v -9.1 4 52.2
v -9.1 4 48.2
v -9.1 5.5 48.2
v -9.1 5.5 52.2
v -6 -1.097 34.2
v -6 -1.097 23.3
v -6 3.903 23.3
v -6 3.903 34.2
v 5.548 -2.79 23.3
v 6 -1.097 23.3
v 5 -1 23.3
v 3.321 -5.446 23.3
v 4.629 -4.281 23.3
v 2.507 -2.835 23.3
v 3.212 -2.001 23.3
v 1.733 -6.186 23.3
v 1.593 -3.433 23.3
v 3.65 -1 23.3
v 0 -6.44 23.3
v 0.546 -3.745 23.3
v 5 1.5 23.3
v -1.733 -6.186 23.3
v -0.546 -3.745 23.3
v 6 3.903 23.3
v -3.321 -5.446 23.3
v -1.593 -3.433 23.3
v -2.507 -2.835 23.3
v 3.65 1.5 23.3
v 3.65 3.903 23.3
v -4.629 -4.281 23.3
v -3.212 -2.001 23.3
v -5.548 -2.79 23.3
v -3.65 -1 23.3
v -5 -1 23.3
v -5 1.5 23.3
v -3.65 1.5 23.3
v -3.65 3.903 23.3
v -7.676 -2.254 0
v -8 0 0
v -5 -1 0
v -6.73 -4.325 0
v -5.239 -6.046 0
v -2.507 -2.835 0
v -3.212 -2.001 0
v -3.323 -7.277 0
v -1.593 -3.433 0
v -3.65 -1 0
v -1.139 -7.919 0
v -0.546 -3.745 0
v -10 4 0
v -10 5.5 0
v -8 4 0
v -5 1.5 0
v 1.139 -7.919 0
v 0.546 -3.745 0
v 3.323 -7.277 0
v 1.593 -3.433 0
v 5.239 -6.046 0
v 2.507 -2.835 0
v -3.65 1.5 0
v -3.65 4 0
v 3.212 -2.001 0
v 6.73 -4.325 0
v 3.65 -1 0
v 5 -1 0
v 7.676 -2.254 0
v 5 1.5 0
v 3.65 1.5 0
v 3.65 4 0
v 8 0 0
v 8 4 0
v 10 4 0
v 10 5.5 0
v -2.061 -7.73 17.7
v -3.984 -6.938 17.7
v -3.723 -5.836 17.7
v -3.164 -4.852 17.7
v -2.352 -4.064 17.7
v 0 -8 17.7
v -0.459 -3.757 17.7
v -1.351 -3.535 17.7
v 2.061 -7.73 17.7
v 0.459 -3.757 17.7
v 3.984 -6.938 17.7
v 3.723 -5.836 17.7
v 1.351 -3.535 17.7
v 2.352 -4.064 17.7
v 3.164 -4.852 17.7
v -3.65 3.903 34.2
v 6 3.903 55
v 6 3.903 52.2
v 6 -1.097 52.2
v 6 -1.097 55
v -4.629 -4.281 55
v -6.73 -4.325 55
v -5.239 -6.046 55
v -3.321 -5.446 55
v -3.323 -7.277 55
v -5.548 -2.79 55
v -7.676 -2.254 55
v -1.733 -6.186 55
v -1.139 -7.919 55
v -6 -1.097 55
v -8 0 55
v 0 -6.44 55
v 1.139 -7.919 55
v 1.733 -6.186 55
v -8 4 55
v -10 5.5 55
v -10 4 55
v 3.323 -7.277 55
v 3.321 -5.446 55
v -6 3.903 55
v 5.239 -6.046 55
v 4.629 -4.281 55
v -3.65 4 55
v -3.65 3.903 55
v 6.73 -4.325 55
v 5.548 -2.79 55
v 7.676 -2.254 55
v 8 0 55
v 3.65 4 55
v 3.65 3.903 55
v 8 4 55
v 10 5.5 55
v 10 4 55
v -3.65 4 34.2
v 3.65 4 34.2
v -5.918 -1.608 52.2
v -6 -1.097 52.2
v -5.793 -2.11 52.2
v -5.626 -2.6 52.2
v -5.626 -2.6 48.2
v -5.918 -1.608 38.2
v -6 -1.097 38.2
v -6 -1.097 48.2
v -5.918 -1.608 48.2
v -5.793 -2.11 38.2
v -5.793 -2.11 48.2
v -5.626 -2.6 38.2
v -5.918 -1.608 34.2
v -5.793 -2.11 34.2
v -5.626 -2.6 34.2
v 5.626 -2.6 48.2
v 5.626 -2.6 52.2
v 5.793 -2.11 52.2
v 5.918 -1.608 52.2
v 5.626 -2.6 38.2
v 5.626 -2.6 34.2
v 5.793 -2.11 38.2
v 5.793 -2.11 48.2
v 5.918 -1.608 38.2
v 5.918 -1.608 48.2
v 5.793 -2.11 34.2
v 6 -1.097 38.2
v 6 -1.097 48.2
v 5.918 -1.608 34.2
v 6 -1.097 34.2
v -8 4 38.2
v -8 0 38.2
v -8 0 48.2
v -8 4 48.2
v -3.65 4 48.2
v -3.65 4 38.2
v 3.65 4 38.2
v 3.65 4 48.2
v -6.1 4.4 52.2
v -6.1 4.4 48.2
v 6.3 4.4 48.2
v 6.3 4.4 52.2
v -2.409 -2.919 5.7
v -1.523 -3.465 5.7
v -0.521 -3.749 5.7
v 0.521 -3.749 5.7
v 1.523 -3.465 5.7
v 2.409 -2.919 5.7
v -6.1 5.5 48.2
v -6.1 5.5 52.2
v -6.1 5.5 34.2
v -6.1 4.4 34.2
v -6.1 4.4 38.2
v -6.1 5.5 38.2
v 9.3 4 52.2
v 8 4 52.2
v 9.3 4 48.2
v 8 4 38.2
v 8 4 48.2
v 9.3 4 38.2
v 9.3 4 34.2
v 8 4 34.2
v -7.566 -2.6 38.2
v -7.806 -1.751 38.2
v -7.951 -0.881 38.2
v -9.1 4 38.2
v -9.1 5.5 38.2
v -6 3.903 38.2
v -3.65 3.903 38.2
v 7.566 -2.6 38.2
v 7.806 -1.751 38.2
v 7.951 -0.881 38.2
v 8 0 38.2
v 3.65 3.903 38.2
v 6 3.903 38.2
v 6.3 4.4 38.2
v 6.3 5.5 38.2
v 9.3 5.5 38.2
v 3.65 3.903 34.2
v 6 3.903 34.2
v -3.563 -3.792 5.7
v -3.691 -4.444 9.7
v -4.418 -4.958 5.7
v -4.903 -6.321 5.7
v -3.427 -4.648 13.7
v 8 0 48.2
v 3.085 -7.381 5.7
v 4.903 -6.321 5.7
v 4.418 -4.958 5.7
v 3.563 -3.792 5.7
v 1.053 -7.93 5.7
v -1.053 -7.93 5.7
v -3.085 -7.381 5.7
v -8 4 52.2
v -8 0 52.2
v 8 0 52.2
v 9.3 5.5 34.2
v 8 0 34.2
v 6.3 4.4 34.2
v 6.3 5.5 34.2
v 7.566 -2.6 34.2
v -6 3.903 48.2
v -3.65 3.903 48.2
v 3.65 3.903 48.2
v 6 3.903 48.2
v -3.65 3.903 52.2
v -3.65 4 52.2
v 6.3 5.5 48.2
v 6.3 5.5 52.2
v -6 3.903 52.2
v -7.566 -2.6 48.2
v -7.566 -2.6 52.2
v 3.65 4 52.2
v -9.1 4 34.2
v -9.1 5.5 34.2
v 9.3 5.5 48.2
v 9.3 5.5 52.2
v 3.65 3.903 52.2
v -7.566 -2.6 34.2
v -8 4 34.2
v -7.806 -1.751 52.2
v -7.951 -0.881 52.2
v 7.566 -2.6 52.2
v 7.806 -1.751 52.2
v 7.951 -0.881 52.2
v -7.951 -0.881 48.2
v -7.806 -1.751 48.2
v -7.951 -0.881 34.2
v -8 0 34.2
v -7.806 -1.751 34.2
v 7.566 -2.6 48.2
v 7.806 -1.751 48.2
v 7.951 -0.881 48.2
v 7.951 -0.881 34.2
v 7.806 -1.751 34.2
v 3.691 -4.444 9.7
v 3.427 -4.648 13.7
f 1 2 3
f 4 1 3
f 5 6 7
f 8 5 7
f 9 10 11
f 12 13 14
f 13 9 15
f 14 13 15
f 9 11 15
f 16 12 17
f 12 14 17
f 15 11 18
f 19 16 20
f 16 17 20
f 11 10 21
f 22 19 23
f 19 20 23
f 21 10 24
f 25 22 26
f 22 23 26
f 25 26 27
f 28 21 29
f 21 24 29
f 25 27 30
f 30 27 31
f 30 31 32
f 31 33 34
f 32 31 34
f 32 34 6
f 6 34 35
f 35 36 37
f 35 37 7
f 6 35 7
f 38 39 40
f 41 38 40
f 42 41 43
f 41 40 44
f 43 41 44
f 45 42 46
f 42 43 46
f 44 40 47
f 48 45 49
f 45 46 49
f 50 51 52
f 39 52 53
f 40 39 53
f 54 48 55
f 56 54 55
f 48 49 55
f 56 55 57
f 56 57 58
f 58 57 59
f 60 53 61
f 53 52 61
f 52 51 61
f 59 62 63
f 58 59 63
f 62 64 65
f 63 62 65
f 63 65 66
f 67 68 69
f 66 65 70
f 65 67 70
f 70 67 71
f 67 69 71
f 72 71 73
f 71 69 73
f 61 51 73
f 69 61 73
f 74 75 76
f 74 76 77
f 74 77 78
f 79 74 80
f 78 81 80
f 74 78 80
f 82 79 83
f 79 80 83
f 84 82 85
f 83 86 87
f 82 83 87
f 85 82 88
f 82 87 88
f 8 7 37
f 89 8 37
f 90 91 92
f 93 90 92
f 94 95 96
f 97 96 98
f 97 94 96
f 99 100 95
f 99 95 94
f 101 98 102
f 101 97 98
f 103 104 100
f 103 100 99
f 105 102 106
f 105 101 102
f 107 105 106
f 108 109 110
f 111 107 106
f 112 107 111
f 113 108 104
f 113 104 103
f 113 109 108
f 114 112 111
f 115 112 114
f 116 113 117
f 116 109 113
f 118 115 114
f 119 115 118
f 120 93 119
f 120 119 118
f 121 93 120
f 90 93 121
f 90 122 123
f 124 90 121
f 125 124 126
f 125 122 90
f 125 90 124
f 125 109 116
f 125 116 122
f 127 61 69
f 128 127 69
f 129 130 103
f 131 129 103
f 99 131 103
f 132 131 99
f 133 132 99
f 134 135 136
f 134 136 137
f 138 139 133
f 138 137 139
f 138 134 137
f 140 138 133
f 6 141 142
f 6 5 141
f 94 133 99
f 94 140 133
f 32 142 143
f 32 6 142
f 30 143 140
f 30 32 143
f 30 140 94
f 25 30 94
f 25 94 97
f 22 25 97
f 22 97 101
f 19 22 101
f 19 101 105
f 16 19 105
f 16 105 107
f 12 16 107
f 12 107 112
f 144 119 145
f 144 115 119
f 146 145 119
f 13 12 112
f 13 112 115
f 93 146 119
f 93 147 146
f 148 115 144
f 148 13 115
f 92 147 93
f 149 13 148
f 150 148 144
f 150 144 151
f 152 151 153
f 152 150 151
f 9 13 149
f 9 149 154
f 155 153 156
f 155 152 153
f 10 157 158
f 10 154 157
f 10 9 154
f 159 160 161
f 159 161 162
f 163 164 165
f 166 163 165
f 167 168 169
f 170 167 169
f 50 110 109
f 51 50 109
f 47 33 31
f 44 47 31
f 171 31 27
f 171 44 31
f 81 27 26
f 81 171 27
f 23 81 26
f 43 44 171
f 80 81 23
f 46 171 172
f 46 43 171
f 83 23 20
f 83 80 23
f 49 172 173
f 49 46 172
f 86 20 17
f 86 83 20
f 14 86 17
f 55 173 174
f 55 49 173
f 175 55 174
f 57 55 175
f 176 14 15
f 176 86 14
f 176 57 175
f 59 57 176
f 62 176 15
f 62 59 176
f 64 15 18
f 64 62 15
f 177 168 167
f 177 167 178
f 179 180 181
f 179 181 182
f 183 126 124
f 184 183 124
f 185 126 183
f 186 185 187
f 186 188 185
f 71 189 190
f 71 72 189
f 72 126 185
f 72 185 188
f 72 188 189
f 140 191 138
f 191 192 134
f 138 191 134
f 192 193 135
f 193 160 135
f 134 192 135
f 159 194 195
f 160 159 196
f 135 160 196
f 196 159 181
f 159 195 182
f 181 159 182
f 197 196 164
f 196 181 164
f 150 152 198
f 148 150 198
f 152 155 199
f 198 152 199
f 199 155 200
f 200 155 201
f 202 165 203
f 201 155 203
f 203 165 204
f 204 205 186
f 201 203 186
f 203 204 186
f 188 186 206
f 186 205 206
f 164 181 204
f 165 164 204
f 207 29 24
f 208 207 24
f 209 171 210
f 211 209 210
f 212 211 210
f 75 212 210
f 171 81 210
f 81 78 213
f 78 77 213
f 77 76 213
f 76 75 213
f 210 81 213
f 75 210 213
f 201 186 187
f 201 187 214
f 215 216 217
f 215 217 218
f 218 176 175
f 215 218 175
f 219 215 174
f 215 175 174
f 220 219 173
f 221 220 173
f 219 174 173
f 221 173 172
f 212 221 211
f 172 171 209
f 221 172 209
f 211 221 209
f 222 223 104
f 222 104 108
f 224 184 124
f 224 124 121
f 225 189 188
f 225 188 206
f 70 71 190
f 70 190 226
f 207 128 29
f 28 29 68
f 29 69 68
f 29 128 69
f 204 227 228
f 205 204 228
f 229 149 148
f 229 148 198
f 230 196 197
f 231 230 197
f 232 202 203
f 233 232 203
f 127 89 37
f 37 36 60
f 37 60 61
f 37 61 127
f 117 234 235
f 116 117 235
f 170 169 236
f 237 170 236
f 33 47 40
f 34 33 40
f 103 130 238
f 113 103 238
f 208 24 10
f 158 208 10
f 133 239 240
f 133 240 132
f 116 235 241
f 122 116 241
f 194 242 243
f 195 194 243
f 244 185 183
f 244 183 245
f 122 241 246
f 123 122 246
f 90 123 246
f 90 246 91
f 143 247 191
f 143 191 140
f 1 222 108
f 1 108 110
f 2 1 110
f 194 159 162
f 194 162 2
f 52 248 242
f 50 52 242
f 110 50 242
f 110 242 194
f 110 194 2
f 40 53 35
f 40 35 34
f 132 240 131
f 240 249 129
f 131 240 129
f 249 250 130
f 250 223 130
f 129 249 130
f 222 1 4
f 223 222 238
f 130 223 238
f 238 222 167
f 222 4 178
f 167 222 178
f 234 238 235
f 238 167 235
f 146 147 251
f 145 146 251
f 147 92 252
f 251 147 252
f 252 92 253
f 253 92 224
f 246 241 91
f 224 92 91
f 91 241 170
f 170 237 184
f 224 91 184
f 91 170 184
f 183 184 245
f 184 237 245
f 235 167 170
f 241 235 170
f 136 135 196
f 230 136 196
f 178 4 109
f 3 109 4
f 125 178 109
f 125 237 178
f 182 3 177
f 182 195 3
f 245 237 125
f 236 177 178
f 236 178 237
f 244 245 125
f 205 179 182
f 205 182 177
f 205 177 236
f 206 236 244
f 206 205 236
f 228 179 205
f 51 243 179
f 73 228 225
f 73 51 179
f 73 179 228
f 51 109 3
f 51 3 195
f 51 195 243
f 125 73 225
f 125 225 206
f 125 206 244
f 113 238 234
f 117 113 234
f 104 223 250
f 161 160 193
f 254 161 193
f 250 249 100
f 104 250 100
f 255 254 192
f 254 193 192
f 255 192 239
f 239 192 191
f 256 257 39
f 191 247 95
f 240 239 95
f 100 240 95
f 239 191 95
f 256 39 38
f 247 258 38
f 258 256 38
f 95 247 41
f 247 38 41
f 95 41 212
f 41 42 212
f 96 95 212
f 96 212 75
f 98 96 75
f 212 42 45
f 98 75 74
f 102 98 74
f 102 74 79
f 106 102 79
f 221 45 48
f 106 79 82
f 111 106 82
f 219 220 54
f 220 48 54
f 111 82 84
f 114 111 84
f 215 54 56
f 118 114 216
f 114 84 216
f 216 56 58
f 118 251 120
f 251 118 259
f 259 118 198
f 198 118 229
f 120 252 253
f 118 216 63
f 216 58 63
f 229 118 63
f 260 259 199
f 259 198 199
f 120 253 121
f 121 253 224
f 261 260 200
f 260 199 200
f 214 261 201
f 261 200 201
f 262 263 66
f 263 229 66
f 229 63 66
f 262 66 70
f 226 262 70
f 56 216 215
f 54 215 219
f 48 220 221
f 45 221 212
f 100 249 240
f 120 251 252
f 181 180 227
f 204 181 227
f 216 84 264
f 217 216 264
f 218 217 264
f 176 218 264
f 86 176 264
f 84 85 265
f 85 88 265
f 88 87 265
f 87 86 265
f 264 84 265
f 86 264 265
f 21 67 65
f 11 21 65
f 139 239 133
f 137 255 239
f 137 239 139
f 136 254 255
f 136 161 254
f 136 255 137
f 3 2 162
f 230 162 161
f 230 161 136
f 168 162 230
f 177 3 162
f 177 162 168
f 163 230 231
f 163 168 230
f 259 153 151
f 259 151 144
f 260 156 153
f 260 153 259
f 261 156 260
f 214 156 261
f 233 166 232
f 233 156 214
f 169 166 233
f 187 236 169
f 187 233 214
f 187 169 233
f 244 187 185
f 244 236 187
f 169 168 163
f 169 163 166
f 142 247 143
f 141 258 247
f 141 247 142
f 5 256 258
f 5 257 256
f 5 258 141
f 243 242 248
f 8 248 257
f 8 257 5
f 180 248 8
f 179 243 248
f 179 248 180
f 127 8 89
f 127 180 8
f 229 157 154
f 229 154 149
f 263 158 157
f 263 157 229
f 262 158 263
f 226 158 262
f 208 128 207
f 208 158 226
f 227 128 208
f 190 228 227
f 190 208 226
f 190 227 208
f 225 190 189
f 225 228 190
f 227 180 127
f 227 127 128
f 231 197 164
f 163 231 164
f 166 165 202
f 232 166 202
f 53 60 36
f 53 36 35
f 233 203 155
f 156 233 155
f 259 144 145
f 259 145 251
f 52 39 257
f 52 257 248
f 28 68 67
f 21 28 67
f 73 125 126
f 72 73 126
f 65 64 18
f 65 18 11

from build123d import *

# Parameters (mm, degrees)
BOX005_W     = 3
BOX005_H     = 10
BOX005_DEPTH = 4
BOX004_W     = 3
BOX004_H     = 10
BOX004_DEPTH = 4
BOX003_W     = 3
BOX003_H     = 10
BOX003_DEPTH = 4
BOX002_W     = 3
BOX002_H     = 10
BOX002_DEPTH = 4
BOX001_W     = 18.4
BOX001_H     = 7
BOX001_DEPTH = 4
BOX_W        = 18.4
BOX_H        = 7
BOX_DEPTH    = 4
PAD001_DEPTH = 34
PAD_DEPTH    = 55


with BuildPart() as w_rfel005:
    # Box005 → Box005 (new body)
    with BuildSketch(Plane(origin=(6.3, -2.6, 34.2), x_dir=(1, 0, 0), z_dir=(0, 0, 1))):
        with Locations((1.5, 5)):
            Rectangle(BOX005_W, BOX005_H)
    extrude(amount=BOX005_DEPTH)


with BuildPart() as w_rfel004:
    # Box004 → Box004 (new body)
    with BuildSketch(Plane(origin=(-9.1, -2.6, 34.2), x_dir=(1, 0, 0), z_dir=(0, 0, 1))):
        with Locations((1.5, 5)):
            Rectangle(BOX004_W, BOX004_H)
    extrude(amount=BOX004_DEPTH)


with BuildPart() as w_rfel003:
    # Box003 → Box003 (new body)
    with BuildSketch(Plane(origin=(6.3, -2.6, 48.2), x_dir=(1, 0, 0), z_dir=(0, 0, 1))):
        with Locations((1.5, 5)):
            Rectangle(BOX003_W, BOX003_H)
    extrude(amount=BOX003_DEPTH)


with BuildPart() as w_rfel002:
    # Box002 → Box002 (new body)
    with BuildSketch(Plane(origin=(-9.1, -2.6, 48.2), x_dir=(1, 0, 0), z_dir=(0, 0, 1))):
        with Locations((1.5, 5)):
            Rectangle(BOX002_W, BOX002_H)
    extrude(amount=BOX002_DEPTH)


with BuildPart() as w_rfel001:
    # Box001 → Box001 (new body)
    with BuildSketch(Plane(origin=(-9.1, -2.6, 34.2), x_dir=(1, 0, 0), z_dir=(0, 0, 1))):
        with Locations((9.2, 3.5)):
            Rectangle(BOX001_W, BOX001_H)
    extrude(amount=BOX001_DEPTH)


with BuildPart() as w_rfel:
    # Box → Box (new body)
    with BuildSketch(Plane(origin=(-9.1, -2.6, 48.2), x_dir=(1, 0, 0), z_dir=(0, 0, 1))):
        with Locations((9.2, 3.5)):
            Rectangle(BOX_W, BOX_H)
    extrude(amount=BOX_DEPTH)


with BuildPart() as kegel:
    # Cone → Cone (revolve)
    with BuildSketch(Plane(origin=(0, -7.3, 5.7), x_dir=(1, 0, 0), z_dir=(0, -1, 0))):
        Polygon((0, 0), (5, 0), (4, 12), (0, 12), align=None)
    revolve(axis=Axis((0, -7.3, 5.7), (0, 0, 1)))


with BuildPart() as body001:
    # Sketch001 → Pad001 (new body)
    with BuildSketch(Plane.XY):
        with BuildLine():
            Line((-6, -0.697355), (-6, 4.302645))
            Line((-6, 4.302645), (6, 4.302645))
            Line((6, 4.302645), (6, -0.697355))
            ThreePointArc((-6, -0.697355), (0, -6.040389), (6, -0.697355))
        make_face()
    extrude(amount=PAD001_DEPTH)


with BuildPart() as body001_1:
    # Body001 placement: moved
    add(body001.part.moved(Location((0, -0.4, 23.3))))


with BuildPart() as cut007:
    # Sketch → Pad (new body)
    with BuildSketch(Plane.XY):
        with BuildLine():
            ThreePointArc((-8, 0), (0, -8), (8, 0))
            Line((8, 4), (8, 0))
            Line((10, 4), (8, 4))
            Line((10, 5.5), (10, 4))
            Line((-10, 5.5), (10, 5.5))
            Line((-10, 4), (-10, 5.5))
            Line((-8, 4), (-10, 4))
            Line((-8, 0), (-8, 4))
        make_face()
        with BuildLine():
            ThreePointArc((-3.65, -1), (0, -3.784508), (3.65, -1))
            Line((3.65, -1), (5, -1))
            Line((5, 1.5), (5, -1))
            Line((3.65, 1.5), (5, 1.5))
            Line((3.65, 4), (3.65, 1.5))
            Line((-3.65, 4), (3.65, 4))
            Line((-3.65, 1.5), (-3.65, 4))
            Line((-3.65, 1.5), (-5, 1.5))
            Line((-5, 1.5), (-5, -1))
            Line((-3.65, -1), (-5, -1))
        make_face(mode=Mode.SUBTRACT)
    extrude(amount=PAD_DEPTH)

    # Cut: cut Body001
    add(body001_1.part, mode=Mode.SUBTRACT)

    # Cut001: cut Kegel
    add(kegel.part, mode=Mode.SUBTRACT)

    # Cut002: cut Würfel
    add(w_rfel.part, mode=Mode.SUBTRACT)

    # Cut003: cut Würfel001
    add(w_rfel001.part, mode=Mode.SUBTRACT)

    # Cut004: cut Würfel002
    add(w_rfel002.part, mode=Mode.SUBTRACT)

    # Cut005: cut Würfel003
    add(w_rfel003.part, mode=Mode.SUBTRACT)

    # Cut006: cut Würfel004
    add(w_rfel004.part, mode=Mode.SUBTRACT)

    # Cut007: cut Würfel005
    add(w_rfel005.part, mode=Mode.SUBTRACT)


solid = cut007.part
